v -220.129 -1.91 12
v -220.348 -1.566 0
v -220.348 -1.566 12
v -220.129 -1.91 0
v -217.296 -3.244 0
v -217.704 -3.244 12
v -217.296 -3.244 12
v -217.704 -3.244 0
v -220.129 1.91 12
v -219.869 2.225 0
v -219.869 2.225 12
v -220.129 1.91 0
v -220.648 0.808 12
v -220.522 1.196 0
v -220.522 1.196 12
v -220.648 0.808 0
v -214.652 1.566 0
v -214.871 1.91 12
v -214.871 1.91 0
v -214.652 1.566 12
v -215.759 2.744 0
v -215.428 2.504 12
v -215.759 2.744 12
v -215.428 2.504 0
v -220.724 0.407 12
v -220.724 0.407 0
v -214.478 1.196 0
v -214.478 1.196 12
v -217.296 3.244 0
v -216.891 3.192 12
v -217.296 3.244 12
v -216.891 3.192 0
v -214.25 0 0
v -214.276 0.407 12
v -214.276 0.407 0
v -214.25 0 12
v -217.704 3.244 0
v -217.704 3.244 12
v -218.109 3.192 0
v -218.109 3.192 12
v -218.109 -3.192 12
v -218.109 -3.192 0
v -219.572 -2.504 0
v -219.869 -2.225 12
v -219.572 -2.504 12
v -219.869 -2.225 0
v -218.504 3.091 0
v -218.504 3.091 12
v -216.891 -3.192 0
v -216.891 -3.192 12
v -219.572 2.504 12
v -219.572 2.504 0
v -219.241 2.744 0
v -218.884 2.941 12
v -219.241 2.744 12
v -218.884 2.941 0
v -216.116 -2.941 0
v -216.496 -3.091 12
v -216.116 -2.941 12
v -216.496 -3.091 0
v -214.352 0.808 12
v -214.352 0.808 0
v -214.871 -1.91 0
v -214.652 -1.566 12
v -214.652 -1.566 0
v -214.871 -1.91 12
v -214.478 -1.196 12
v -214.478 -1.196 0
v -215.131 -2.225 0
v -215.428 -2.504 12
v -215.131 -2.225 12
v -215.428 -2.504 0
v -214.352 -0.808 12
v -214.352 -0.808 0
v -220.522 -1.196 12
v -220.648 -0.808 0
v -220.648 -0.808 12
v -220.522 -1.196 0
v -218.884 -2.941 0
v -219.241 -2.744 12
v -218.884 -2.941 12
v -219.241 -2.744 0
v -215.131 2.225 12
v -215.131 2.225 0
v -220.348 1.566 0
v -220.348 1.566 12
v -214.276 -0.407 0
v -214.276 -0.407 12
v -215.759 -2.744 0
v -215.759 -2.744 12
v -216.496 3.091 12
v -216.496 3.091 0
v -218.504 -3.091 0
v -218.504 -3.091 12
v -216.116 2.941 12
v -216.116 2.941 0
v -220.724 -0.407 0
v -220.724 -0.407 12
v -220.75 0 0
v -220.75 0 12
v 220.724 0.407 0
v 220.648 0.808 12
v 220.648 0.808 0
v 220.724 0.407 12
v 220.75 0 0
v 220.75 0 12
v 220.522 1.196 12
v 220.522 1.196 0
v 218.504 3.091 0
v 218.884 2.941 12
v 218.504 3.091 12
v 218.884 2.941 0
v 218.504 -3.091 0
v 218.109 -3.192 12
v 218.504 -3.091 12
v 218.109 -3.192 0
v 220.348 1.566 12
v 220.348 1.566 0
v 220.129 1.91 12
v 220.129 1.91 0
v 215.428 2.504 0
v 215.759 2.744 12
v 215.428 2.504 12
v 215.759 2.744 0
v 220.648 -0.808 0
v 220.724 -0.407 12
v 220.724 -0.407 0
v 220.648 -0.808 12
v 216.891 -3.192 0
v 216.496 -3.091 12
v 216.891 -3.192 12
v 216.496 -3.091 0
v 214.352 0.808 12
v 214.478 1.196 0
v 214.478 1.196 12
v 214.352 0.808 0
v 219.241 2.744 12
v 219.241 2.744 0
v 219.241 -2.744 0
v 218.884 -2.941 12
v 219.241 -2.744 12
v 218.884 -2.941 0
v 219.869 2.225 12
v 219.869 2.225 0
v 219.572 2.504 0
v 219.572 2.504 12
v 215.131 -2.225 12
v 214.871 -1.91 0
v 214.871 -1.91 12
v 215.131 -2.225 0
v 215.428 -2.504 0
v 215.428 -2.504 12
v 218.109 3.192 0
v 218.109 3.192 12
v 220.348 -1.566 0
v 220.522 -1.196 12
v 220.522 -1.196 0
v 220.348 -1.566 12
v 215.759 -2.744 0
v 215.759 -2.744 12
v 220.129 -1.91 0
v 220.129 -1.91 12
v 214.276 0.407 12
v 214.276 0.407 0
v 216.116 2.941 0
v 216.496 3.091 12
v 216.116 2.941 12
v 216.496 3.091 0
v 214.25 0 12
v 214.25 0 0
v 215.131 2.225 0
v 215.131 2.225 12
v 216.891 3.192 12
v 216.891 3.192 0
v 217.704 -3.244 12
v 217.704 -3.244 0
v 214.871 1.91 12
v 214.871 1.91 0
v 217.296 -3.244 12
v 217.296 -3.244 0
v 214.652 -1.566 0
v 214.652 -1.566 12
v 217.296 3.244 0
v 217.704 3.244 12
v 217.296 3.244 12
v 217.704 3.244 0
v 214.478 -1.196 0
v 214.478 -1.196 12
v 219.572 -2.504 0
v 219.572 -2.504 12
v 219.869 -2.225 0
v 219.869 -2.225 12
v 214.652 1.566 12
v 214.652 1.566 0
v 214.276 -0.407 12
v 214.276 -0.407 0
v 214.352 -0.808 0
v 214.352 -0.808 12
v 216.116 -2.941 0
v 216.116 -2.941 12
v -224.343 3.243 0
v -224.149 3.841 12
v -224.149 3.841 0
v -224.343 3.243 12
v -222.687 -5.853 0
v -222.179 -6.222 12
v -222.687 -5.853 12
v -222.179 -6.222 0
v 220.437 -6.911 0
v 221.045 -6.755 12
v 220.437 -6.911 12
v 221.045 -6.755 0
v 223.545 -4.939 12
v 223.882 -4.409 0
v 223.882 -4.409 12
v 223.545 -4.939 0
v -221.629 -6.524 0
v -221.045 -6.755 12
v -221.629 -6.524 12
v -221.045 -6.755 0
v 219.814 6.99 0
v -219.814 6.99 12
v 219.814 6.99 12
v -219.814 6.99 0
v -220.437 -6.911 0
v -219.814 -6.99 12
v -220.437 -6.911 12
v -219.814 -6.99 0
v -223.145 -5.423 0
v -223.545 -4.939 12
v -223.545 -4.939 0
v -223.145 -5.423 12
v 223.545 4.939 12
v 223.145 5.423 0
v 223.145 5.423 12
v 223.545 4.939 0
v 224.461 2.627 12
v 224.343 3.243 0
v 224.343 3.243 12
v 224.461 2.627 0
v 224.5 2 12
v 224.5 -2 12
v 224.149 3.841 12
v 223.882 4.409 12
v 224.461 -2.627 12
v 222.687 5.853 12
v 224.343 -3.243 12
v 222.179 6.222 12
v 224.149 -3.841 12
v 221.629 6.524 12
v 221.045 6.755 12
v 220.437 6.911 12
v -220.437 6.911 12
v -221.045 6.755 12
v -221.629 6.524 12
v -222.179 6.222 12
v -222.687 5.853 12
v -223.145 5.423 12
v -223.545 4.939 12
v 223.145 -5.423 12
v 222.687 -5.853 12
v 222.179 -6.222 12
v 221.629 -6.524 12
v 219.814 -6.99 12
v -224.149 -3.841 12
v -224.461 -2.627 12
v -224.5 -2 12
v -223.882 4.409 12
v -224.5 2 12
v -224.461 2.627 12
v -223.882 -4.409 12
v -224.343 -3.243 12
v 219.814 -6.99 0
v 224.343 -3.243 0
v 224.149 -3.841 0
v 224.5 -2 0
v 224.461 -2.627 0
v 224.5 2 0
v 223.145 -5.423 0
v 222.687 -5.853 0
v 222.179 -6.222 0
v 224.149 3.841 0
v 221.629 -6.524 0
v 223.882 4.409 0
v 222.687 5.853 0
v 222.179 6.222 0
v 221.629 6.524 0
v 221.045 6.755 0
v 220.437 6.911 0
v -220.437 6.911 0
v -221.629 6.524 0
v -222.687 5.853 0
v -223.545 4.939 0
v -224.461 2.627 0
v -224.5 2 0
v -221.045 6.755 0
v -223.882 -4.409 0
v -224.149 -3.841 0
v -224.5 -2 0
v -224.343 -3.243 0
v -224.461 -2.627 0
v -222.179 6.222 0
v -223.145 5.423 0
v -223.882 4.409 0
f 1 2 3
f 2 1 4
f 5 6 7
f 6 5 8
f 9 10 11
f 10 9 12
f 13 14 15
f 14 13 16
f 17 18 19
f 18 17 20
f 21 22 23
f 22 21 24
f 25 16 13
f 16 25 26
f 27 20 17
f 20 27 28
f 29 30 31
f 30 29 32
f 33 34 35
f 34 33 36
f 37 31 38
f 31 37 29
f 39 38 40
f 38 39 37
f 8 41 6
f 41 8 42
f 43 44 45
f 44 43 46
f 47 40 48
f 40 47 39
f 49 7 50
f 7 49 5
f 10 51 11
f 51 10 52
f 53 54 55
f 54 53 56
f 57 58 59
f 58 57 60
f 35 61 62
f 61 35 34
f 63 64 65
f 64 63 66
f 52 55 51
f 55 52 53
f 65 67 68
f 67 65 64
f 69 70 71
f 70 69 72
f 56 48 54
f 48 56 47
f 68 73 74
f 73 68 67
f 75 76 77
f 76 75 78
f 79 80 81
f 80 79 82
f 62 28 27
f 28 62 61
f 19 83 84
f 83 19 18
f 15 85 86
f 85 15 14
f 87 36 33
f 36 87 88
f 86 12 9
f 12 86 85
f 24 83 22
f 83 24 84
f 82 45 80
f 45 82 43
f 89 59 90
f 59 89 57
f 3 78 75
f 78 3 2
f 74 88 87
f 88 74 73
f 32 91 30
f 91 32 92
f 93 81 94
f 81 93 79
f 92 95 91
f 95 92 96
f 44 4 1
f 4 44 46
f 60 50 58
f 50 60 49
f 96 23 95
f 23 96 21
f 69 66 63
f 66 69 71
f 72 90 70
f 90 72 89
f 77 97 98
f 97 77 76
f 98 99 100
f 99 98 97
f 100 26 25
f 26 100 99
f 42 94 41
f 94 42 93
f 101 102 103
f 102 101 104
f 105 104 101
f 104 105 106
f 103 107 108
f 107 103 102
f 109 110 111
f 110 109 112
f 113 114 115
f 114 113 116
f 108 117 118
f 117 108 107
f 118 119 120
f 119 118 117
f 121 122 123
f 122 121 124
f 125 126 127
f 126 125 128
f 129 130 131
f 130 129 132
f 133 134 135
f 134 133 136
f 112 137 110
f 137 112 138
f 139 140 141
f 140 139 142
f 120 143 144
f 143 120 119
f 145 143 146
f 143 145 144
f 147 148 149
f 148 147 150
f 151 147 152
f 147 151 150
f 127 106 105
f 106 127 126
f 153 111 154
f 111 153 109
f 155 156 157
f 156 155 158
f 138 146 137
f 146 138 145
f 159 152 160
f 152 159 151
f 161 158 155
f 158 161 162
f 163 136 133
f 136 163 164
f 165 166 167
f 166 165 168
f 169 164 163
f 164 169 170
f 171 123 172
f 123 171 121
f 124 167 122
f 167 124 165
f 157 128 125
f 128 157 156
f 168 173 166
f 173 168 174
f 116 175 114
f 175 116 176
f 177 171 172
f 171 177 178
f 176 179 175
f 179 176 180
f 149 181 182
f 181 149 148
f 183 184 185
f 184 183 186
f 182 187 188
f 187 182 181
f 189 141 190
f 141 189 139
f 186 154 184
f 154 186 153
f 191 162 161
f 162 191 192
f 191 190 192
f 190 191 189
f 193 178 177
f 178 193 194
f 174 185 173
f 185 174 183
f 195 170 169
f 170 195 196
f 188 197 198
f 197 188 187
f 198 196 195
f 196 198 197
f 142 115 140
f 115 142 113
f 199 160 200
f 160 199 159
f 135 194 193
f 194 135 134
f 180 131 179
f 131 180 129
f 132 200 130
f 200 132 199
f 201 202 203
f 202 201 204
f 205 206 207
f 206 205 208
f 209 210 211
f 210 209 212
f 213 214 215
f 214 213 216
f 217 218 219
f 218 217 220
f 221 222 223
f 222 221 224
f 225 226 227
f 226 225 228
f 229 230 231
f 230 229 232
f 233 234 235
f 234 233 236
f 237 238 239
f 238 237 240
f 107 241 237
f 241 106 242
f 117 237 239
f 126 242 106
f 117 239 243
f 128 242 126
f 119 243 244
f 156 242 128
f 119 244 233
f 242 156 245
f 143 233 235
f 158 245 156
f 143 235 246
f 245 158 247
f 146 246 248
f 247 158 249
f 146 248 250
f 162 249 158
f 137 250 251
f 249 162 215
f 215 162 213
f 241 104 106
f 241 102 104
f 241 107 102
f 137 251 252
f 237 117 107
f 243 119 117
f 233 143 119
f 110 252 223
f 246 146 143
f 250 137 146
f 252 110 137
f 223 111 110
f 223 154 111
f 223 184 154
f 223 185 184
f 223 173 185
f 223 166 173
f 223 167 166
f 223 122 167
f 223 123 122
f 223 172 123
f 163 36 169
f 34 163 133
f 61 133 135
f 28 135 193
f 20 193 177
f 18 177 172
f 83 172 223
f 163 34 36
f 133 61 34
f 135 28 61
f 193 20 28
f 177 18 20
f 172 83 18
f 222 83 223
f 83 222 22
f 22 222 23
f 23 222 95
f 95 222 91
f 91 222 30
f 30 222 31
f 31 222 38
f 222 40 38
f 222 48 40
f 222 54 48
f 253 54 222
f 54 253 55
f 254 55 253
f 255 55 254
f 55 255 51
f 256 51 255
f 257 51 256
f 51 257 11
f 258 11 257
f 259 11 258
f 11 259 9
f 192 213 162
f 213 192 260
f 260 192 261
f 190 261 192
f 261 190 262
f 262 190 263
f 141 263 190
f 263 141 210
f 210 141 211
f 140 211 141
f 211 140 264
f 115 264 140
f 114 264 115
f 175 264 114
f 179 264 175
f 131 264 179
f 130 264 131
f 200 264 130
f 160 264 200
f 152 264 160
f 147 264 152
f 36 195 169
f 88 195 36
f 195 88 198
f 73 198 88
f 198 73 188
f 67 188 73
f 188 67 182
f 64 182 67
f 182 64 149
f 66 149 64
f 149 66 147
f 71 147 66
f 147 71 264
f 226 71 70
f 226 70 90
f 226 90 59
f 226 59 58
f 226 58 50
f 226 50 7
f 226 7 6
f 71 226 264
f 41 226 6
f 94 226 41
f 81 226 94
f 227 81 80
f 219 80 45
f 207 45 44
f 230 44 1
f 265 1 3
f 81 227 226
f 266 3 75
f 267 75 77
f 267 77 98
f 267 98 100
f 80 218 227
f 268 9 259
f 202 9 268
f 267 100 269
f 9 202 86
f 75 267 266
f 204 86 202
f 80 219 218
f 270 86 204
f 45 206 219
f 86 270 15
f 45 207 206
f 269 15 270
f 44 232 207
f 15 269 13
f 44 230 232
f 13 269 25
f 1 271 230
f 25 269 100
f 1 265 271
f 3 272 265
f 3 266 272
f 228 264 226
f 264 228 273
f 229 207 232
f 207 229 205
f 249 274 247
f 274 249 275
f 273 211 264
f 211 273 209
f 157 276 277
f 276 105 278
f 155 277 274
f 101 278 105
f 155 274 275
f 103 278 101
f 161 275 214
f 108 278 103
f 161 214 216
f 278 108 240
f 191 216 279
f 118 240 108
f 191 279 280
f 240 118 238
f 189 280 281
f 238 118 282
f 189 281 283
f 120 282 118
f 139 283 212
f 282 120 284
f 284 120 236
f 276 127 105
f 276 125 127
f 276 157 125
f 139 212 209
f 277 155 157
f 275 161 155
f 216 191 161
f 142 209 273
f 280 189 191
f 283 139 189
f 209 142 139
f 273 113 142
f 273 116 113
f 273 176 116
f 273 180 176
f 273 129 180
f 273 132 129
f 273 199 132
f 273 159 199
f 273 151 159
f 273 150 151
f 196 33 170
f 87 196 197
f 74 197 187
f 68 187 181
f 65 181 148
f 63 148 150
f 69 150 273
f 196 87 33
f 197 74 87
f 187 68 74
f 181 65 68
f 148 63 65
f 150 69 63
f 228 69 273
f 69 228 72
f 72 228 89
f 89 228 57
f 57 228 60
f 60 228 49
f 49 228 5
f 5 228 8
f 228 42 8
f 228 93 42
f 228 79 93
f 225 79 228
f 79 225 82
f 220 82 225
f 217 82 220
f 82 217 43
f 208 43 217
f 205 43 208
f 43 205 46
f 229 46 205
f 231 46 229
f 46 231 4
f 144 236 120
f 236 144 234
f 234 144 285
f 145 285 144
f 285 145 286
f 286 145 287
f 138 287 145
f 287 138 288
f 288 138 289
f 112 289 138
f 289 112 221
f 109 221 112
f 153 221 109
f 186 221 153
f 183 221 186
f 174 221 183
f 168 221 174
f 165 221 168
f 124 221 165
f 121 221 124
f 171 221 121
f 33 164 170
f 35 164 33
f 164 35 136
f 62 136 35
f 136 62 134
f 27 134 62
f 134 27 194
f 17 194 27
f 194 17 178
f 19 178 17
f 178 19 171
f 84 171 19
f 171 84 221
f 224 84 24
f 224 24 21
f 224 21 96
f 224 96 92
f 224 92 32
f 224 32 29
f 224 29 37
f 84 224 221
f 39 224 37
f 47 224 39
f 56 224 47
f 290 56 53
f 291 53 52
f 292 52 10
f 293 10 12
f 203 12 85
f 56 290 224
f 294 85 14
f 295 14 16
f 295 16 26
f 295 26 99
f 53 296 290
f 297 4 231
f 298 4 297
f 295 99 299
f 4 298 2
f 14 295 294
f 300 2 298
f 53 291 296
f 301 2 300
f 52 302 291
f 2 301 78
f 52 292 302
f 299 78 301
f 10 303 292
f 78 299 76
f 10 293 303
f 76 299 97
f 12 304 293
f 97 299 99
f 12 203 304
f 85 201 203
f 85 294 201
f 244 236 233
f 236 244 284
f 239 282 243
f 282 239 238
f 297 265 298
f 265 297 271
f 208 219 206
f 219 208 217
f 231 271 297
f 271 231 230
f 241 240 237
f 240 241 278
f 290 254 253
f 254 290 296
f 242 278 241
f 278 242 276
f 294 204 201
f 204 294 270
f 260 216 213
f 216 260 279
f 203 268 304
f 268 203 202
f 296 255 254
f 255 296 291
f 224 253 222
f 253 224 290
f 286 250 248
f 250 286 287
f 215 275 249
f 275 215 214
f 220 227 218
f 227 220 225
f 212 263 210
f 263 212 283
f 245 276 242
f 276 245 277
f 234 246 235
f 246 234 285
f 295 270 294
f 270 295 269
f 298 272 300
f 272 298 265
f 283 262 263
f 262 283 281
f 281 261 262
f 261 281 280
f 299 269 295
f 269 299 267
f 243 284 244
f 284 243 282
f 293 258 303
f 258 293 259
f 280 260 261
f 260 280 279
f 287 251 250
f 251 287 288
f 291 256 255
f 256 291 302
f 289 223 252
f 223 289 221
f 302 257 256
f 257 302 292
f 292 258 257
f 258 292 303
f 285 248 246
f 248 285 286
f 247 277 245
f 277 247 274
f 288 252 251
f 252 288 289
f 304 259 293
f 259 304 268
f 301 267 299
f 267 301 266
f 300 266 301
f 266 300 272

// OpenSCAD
$fn = 50;


difference() {
	union() {
		hull() {
			translate(v = [-219.5000000000, 2.0000000000, 0]) {
				cylinder(h = 12, r = 5);
			}
			translate(v = [219.5000000000, 2.0000000000, 0]) {
				cylinder(h = 12, r = 5);
			}
			translate(v = [-219.5000000000, -2.0000000000, 0]) {
				cylinder(h = 12, r = 5);
			}
			translate(v = [219.5000000000, -2.0000000000, 0]) {
				cylinder(h = 12, r = 5);
			}
		}
	}
	union() {
		translate(v = [-217.5000000000, 0.0000000000, -100.0000000000]) {
			cylinder(h = 200, r = 3.2500000000);
		}
		translate(v = [-217.5000000000, 0.0000000000, -100.0000000000]) {
			cylinder(h = 200, r = 3.2500000000);
		}
		translate(v = [217.5000000000, 0.0000000000, -100.0000000000]) {
			cylinder(h = 200, r = 3.2500000000);
		}
		translate(v = [217.5000000000, 0.0000000000, -100.0000000000]) {
			cylinder(h = 200, r = 3.2500000000);
		}
	}
}
